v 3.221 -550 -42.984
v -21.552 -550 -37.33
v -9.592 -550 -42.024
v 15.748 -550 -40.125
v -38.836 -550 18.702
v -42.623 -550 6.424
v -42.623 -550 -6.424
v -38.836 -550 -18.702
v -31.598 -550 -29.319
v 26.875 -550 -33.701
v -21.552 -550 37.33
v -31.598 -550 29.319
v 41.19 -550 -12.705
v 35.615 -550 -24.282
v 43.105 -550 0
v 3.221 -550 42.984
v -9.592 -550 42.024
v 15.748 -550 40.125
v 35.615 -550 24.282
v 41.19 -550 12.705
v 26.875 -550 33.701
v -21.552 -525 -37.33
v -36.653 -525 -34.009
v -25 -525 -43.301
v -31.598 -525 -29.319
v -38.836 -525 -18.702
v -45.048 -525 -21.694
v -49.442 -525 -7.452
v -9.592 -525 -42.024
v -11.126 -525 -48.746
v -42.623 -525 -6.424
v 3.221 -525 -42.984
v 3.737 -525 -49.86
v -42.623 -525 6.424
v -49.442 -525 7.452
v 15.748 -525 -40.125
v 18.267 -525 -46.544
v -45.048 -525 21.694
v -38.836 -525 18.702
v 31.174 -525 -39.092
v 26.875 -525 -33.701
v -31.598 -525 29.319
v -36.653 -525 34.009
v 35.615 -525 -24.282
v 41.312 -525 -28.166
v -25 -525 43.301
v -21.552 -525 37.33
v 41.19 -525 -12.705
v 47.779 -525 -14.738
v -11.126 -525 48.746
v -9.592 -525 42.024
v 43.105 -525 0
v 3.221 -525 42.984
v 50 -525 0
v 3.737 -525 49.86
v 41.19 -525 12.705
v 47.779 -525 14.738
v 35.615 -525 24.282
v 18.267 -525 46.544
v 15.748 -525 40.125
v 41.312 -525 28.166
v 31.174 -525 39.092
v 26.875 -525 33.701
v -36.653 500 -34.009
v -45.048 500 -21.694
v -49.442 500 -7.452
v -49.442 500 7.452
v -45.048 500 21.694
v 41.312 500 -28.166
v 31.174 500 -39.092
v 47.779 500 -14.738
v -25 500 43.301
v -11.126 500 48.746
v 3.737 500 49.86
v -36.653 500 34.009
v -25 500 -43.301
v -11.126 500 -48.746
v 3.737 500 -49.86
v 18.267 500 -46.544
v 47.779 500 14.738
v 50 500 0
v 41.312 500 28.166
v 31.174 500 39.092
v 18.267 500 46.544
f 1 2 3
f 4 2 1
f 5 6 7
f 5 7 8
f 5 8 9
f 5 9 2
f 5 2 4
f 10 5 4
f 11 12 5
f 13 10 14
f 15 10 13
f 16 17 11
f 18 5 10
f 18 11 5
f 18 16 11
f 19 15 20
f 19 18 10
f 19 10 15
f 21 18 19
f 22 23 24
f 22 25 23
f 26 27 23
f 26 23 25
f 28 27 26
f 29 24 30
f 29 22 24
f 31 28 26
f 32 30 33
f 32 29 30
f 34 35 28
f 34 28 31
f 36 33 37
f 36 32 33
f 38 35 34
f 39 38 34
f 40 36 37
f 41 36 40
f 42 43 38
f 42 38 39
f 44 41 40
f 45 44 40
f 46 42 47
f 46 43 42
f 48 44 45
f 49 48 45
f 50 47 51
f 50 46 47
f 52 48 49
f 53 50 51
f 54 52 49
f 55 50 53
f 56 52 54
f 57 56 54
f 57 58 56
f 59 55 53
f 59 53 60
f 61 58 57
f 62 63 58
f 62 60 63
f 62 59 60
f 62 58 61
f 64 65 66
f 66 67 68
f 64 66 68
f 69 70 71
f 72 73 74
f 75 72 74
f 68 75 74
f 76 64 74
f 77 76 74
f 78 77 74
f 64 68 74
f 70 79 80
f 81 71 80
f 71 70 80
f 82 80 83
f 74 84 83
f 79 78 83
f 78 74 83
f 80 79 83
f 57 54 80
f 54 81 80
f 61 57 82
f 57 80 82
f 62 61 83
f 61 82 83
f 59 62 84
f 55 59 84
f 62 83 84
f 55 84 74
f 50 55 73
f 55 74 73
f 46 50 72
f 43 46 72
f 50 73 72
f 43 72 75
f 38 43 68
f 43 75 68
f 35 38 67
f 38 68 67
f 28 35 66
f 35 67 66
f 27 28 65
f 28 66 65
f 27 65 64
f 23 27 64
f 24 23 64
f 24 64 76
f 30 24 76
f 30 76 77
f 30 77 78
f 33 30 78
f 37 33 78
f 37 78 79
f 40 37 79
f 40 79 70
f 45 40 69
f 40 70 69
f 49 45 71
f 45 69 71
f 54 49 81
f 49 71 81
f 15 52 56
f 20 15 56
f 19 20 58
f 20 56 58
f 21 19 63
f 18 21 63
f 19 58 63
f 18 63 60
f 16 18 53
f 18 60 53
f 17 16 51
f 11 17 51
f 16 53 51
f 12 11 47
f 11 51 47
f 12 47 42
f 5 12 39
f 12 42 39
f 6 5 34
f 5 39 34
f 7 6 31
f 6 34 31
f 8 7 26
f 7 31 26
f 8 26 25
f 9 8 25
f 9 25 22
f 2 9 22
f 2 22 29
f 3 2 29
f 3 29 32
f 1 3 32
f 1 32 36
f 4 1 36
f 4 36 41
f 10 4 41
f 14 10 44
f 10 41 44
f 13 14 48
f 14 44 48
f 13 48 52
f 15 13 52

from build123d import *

# Parameters (mm, degrees)
F0_R      = 50
F1_DEPTH  = 500
F2_R      = 44.431358
F1_FACE_R = 50
F3_DEPTH  = 25
F4_R      = 43.104754
F5_DEPTH  = 25


with BuildPart() as f1:
    # F0 (on Front) → F1 (new body, symmetric)
    with BuildSketch(Plane.XZ):
        Circle(F0_R)
    extrude(amount=F1_DEPTH, both=True)

    # F2 (on Front) + F1_face (on face) → F3 (join)
    with BuildSketch(Plane.XZ):
        Circle(F2_R)
    with BuildSketch(Plane.XZ.offset(500)):
        Circle(F1_FACE_R)
    extrude(amount=F3_DEPTH)

    # F4 (on face) → F5 (join)
    with BuildSketch(Plane.XZ.offset(525)):
        Circle(F4_R)
    extrude(amount=F5_DEPTH)


solid = f1.part
